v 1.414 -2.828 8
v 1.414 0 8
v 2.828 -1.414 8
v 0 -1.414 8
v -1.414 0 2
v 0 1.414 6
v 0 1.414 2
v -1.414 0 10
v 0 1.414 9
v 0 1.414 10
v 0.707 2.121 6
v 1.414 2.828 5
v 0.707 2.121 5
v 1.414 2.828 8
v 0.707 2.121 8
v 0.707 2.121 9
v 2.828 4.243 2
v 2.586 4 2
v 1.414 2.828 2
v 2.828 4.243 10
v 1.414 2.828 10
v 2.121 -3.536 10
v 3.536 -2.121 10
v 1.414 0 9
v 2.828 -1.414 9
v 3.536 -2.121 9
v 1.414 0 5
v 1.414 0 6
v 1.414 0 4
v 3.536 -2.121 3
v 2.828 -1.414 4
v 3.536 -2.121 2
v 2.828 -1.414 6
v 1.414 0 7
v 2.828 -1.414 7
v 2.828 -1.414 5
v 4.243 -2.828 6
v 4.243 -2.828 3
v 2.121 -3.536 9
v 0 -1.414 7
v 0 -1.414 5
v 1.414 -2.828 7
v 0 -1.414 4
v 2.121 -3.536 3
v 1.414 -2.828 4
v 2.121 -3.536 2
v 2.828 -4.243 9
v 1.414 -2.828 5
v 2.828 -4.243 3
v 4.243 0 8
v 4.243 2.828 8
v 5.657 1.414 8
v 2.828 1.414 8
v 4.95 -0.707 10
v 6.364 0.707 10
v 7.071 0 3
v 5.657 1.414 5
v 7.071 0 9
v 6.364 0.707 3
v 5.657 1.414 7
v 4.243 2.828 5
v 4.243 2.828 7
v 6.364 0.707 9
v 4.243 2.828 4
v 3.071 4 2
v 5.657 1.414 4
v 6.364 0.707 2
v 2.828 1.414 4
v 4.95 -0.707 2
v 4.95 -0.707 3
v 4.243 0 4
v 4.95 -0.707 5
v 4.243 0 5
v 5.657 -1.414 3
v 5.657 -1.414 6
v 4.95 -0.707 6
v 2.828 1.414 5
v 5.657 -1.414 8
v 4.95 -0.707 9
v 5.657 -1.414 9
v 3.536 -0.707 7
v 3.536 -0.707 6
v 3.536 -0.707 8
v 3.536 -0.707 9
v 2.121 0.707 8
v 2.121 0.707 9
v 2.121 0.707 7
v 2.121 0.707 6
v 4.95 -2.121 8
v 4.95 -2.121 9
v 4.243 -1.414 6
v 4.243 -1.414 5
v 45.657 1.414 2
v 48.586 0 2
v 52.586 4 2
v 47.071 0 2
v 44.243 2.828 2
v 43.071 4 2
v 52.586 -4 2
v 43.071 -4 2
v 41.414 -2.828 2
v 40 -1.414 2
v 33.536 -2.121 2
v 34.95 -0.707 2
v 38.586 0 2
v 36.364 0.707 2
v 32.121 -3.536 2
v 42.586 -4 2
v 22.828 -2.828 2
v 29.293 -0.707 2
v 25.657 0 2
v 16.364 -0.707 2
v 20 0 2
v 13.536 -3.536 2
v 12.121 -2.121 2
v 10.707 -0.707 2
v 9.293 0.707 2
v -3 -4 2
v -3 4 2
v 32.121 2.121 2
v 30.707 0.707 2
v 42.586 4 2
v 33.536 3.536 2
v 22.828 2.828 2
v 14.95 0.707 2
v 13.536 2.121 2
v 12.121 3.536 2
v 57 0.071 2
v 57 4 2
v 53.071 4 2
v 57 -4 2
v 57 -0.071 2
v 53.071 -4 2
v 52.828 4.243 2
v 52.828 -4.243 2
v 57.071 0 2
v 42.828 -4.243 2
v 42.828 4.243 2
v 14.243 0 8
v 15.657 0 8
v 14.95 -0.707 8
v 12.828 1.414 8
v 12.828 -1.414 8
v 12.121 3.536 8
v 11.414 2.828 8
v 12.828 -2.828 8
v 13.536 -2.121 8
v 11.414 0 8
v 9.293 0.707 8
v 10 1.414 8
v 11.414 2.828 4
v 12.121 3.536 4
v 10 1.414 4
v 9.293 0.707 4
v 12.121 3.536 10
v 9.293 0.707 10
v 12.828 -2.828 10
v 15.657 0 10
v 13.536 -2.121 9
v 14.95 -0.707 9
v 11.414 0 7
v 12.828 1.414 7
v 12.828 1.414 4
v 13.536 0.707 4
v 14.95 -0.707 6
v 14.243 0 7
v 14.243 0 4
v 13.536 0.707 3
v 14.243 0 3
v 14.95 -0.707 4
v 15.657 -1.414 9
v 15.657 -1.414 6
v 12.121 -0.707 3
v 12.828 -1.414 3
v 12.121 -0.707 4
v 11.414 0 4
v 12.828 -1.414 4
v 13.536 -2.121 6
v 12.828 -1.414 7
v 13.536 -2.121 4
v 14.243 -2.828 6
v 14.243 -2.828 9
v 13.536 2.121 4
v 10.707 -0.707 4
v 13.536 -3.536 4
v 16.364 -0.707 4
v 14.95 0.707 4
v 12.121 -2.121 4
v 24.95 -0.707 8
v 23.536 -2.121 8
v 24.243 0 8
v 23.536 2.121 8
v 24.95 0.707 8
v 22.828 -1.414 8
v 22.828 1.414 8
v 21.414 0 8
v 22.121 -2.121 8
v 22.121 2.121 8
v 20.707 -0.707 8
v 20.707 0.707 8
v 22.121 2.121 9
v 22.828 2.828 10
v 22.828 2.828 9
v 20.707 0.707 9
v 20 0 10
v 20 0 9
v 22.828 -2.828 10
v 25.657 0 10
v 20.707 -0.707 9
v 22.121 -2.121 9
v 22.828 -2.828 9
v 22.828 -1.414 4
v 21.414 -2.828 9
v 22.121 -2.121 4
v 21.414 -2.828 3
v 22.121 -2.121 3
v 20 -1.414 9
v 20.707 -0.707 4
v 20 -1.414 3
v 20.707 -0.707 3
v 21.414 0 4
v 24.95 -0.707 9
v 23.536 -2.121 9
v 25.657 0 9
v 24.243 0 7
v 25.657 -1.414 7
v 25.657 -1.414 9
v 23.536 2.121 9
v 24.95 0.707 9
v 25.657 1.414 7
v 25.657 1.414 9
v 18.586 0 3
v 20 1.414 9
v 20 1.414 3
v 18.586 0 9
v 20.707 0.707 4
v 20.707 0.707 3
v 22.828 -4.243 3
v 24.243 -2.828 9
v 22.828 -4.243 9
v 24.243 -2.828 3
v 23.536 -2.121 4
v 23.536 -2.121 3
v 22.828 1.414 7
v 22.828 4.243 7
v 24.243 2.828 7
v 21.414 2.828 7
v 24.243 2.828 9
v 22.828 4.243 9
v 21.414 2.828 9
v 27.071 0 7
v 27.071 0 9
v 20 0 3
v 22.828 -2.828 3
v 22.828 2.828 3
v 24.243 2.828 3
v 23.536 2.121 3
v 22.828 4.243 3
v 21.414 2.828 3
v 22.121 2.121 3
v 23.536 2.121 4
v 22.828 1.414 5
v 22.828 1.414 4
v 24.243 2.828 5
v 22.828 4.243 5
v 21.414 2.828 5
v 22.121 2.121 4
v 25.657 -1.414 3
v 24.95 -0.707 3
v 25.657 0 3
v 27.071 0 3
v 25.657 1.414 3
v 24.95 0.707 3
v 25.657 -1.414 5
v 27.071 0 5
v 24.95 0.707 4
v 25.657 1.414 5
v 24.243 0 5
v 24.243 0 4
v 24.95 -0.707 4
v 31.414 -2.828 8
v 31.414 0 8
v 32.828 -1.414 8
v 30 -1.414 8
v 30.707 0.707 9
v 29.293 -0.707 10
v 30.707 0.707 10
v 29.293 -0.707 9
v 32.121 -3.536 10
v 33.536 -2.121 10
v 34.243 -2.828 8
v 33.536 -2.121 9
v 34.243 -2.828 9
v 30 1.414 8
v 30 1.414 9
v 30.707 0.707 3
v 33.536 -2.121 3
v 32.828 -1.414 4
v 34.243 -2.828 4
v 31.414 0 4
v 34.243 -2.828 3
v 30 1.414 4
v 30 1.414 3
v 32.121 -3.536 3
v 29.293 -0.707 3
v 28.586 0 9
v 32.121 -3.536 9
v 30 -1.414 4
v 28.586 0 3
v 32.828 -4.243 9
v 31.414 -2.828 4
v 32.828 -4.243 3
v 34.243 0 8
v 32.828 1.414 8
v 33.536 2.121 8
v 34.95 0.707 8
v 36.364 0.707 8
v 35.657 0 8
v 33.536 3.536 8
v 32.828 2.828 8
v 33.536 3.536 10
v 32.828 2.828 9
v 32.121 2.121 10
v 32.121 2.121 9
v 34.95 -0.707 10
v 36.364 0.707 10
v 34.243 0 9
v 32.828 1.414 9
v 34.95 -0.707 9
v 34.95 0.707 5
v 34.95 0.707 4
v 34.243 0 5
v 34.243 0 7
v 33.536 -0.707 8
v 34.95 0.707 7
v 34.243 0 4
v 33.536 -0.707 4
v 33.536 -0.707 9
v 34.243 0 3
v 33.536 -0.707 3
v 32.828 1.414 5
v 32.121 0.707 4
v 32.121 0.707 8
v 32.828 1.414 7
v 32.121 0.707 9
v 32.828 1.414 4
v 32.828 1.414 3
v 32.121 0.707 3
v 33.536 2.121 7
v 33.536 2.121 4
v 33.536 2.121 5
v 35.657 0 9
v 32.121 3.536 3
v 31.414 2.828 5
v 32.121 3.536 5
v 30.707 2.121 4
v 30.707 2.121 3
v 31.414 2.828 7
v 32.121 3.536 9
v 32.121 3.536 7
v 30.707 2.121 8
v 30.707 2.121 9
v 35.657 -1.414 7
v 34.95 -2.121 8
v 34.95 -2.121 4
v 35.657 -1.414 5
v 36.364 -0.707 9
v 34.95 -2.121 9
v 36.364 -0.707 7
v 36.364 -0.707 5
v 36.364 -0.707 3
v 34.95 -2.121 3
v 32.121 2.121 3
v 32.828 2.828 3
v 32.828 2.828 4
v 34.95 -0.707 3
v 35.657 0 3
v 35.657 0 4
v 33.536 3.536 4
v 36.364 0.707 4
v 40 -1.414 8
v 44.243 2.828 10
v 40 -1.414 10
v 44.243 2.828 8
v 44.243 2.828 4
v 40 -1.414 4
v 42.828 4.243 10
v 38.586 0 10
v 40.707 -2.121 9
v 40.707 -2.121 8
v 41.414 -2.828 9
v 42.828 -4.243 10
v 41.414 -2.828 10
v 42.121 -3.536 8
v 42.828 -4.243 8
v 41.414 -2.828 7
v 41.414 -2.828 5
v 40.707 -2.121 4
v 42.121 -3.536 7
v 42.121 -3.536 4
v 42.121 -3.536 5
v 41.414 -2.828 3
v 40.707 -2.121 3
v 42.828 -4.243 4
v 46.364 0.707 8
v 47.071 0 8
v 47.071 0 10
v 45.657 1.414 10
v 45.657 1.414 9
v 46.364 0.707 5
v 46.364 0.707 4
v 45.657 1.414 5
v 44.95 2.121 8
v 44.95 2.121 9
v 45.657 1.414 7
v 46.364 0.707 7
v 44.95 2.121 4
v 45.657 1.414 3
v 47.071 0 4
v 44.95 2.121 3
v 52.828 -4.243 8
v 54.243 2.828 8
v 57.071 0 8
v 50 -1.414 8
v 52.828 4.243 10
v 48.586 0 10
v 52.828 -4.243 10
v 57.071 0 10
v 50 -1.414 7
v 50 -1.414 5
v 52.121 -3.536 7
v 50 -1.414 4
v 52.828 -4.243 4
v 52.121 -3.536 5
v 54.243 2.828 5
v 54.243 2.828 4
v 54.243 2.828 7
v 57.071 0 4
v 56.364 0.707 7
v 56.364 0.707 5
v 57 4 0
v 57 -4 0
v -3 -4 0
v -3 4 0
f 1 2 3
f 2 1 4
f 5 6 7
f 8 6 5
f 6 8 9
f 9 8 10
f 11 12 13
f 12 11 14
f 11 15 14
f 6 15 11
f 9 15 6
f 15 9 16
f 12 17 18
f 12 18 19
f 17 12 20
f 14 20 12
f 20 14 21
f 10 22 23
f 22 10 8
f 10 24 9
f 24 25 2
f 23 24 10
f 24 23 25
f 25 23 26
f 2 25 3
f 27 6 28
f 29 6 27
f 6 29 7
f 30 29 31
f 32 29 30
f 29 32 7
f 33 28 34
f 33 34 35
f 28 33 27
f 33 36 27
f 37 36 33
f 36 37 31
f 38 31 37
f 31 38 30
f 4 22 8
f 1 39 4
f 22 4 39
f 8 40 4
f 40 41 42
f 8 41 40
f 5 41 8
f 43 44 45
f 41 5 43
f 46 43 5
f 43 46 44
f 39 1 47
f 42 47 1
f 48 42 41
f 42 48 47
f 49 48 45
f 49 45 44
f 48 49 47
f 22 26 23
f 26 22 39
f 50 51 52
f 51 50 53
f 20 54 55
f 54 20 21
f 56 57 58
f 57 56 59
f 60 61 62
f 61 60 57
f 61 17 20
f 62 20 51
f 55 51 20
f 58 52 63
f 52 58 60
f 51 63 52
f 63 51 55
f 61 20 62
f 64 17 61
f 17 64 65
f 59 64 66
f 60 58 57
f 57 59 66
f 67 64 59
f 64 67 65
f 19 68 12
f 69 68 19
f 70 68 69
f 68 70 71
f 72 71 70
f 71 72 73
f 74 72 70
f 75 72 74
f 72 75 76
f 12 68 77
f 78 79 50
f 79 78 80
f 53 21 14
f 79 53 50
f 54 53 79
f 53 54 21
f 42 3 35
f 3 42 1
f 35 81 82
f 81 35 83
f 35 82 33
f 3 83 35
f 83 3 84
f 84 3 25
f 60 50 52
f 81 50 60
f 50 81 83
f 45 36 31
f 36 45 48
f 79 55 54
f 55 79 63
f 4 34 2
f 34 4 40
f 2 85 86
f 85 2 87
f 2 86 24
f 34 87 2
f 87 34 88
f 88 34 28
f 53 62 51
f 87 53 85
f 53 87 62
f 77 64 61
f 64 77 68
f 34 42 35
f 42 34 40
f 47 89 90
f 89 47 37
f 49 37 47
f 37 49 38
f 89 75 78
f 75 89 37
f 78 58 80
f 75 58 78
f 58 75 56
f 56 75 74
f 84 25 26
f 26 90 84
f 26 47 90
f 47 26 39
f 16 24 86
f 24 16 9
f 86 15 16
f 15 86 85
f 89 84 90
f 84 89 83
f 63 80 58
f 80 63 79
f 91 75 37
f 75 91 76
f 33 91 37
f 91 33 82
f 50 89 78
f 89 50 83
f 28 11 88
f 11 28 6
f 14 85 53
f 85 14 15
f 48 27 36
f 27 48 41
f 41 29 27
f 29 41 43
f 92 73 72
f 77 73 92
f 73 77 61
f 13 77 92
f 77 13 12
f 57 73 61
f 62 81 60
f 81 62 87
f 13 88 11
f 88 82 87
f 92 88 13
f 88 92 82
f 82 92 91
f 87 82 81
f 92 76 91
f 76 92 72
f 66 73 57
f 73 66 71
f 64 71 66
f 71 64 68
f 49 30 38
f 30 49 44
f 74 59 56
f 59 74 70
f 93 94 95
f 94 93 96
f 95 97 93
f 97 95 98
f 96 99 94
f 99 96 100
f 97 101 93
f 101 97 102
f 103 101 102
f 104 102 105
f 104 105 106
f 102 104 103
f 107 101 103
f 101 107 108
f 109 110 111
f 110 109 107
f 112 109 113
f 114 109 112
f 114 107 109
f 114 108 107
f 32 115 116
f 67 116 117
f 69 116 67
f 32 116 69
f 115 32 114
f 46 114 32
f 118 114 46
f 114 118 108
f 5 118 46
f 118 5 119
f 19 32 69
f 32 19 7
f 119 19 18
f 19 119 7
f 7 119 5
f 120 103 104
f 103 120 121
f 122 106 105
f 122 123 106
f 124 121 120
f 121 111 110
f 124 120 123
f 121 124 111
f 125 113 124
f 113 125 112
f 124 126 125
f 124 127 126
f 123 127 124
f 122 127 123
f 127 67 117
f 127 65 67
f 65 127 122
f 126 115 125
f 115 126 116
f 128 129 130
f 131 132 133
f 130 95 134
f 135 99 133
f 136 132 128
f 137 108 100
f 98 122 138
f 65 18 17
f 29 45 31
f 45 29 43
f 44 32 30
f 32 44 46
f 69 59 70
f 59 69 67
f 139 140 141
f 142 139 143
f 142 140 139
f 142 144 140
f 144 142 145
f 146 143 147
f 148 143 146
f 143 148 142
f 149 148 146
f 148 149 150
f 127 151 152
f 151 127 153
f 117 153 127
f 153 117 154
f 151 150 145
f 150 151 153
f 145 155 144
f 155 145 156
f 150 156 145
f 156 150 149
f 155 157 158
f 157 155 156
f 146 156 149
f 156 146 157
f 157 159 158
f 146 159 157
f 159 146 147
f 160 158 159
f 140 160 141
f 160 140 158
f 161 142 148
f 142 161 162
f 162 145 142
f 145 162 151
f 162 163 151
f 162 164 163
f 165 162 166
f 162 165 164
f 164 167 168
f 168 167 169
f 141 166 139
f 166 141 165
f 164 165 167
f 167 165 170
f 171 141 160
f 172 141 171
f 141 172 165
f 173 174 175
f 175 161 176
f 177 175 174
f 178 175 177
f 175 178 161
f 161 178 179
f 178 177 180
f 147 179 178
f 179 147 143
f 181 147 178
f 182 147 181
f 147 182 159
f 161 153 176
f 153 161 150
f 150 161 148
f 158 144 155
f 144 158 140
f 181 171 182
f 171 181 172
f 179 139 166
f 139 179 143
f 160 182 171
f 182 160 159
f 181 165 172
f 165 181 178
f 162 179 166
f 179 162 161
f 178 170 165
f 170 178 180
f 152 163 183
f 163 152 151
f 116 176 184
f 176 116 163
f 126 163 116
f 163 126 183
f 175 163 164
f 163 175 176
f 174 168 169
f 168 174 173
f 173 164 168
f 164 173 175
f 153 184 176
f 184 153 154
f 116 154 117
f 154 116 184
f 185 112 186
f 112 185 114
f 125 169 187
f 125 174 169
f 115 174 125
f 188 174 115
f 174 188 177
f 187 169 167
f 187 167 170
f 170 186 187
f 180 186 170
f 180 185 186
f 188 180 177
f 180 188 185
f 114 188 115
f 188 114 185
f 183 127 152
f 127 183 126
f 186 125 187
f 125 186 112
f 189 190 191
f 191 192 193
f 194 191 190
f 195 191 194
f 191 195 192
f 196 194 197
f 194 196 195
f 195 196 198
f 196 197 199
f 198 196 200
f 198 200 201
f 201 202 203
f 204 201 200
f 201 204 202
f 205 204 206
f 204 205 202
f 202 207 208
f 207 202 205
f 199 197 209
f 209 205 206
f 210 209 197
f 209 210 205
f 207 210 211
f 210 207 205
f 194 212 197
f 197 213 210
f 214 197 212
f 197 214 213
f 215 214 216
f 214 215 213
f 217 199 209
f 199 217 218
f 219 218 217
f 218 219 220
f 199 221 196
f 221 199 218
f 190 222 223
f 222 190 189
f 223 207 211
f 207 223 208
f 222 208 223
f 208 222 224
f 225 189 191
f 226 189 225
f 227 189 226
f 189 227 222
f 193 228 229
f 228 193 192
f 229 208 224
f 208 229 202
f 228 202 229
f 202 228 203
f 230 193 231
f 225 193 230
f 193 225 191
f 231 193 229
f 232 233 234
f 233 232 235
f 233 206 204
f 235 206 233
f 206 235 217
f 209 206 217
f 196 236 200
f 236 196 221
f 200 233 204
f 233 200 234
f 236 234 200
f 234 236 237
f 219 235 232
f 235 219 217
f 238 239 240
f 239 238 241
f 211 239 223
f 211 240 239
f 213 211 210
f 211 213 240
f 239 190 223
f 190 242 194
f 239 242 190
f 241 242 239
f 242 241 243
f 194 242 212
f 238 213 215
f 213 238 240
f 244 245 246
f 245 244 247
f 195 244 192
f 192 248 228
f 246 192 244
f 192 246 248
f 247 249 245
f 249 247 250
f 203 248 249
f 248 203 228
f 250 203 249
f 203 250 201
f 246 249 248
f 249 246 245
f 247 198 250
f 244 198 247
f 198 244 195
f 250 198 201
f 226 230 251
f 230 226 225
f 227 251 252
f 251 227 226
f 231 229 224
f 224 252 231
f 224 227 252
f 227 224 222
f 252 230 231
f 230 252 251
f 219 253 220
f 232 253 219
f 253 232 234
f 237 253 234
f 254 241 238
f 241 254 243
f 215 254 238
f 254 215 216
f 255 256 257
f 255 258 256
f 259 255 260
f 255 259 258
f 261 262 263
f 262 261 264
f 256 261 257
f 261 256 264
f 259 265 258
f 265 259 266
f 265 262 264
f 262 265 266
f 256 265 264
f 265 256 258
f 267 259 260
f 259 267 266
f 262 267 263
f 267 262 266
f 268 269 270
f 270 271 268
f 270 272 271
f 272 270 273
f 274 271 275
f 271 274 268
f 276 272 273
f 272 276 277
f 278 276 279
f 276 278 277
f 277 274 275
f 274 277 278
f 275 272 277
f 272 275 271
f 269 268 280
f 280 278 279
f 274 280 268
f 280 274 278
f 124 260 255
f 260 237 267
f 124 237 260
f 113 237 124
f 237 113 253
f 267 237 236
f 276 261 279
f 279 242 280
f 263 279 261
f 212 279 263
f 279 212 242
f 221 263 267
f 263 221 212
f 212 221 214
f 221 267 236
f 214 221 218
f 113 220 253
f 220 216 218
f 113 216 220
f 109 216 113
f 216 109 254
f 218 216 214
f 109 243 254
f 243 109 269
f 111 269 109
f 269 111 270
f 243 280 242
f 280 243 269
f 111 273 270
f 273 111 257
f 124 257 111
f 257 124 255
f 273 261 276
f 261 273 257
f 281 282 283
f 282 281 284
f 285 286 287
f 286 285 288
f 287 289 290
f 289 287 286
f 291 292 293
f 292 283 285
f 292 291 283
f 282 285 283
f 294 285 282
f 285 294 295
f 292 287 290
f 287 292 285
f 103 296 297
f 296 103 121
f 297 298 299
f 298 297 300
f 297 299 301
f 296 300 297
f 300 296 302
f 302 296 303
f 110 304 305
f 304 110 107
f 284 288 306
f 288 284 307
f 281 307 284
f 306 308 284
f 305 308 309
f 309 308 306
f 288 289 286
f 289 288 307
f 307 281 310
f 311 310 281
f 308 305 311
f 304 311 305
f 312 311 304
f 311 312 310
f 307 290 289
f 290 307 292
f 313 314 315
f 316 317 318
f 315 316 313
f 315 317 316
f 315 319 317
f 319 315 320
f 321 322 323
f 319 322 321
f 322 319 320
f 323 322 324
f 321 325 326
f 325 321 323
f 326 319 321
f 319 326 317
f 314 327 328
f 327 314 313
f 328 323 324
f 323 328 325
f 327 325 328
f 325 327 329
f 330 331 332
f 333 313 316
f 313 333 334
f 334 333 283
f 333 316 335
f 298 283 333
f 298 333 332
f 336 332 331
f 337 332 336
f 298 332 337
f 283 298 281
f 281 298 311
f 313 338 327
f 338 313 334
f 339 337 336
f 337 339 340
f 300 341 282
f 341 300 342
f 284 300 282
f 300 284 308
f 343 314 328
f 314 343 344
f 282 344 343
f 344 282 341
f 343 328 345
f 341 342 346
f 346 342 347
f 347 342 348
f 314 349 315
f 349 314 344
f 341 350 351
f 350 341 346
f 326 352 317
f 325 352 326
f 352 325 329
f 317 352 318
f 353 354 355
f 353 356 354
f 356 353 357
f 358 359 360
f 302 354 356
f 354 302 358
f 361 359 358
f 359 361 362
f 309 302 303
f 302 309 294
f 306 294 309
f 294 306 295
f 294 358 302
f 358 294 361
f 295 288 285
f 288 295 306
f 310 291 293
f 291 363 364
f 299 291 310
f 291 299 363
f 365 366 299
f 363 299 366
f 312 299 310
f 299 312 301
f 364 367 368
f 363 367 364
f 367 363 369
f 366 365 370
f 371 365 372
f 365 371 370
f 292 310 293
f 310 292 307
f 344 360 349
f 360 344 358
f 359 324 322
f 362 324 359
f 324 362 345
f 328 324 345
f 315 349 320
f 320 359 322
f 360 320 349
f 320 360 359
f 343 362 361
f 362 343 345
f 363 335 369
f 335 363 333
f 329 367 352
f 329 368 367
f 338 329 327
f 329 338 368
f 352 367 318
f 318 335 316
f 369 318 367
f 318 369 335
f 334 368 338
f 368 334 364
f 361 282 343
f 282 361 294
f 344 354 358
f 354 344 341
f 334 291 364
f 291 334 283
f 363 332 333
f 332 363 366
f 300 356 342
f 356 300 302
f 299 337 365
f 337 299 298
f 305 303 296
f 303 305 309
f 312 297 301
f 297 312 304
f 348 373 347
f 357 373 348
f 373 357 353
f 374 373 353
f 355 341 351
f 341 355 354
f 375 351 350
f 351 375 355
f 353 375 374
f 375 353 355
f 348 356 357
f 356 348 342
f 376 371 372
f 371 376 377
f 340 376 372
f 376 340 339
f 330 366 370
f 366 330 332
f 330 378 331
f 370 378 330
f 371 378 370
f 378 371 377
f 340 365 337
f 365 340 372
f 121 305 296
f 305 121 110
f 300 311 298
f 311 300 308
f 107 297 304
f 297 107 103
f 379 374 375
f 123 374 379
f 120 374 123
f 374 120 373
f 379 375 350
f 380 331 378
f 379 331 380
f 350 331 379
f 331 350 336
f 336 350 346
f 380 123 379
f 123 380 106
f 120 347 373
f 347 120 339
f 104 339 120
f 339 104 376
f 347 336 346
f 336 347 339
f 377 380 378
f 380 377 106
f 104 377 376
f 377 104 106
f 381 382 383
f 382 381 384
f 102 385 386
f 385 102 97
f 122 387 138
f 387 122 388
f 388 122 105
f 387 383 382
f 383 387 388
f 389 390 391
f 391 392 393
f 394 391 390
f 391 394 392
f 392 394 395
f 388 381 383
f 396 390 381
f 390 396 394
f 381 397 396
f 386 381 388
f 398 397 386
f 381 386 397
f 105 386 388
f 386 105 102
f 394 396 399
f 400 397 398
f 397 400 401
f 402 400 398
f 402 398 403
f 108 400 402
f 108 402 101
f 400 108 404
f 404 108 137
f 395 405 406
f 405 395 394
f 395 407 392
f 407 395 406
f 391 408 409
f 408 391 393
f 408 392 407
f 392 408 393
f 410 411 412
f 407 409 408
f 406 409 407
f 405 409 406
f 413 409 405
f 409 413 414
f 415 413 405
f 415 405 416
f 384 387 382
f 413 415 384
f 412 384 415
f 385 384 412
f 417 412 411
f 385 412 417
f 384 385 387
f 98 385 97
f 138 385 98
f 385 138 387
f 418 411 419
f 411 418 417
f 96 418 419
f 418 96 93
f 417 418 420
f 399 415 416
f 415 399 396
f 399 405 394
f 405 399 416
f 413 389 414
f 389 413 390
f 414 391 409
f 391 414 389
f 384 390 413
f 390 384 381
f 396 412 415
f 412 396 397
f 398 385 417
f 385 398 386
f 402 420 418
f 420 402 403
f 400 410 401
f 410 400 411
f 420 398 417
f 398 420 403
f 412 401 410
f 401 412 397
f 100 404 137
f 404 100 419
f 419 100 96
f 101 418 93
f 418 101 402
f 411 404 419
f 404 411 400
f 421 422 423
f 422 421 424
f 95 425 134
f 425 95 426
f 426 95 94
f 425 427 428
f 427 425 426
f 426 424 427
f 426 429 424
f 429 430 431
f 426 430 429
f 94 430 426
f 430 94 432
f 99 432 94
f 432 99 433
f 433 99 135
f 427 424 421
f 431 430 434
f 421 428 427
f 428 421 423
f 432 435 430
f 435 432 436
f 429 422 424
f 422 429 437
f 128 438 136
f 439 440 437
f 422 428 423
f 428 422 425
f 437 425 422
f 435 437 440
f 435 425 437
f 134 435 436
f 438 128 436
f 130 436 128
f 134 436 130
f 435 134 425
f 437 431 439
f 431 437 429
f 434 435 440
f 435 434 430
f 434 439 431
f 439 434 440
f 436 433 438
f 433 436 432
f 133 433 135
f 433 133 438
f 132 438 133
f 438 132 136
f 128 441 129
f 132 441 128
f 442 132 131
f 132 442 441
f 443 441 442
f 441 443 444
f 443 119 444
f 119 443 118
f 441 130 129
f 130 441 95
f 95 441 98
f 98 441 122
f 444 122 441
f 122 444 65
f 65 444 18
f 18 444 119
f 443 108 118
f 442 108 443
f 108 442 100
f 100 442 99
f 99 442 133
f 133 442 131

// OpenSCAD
// Generated 3D Letter Combinations
// NICK   + BROOKE

$fn=20;
// Base Plate
translate([-3, -4, 0]) cube([60, 8, 2]);

// Letter N + B
translate([0,0,9]) translate([0, 0, 0]) rotate([45,90,0]) {
  union() {
    translate([0, 0, 0]) {
        cube([2,2,2], center=true);
    }
    translate([0, 0, 1]) {
        cube([2,2,2], center=true);
    }
    translate([0, 0, 2]) {
        cube([2,2,2], center=true);
    }
    translate([0, 0, 3]) {
        cube([2,2,2], center=true);
    }
    translate([0, 4, 0]) {
        cube([2,2,2], center=true);
    }
    translate([0, 4, 1]) {
        cube([2,2,2], center=true);
    }
    translate([0, 4, 2]) {
        cube([2,2,2], center=true);
    }
    translate([0, 4, 3]) {
        cube([2,2,2], center=true);
    }
    translate([1, 0, 0]) {
        cube([2,2,2], center=true);
    }
    translate([1, 0, 4]) {
        cube([2,2,2], center=true);
    }
    translate([1, 1, 0]) {
        cube([2,2,2], center=true);
    }
    translate([1, 1, 4]) {
        cube([2,2,2], center=true);
    }
    translate([1, 4, 0]) {
        cube([2,2,2], center=true);
    }
    translate([1, 4, 4]) {
        cube([2,2,2], center=true);
    }
    translate([2, 0, 0]) {
        cube([2,2,2], center=true);
    }
    translate([2, 0, 4]) {
        cube([2,2,2], center=true);
    }
    translate([2, 2, 0]) {
        cube([2,2,2], center=true);
    }
    translate([2, 2, 4]) {
        cube([2,2,2], center=true);
    }
    translate([2, 4, 0]) {
        cube([2,2,2], center=true);
    }
    translate([2, 4, 4]) {
        cube([2,2,2], center=true);
    }
    translate([3, 0, 0]) {
        cube([2,2,2], center=true);
    }
    translate([3, 0, 1]) {
        cube([2,2,2], center=true);
    }
    translate([3, 0, 2]) {
        cube([2,2,2], center=true);
    }
    translate([3, 0, 3]) {
        cube([2,2,2], center=true);
    }
    translate([3, 3, 0]) {
        cube([2,2,2], center=true);
    }
    translate([3, 3, 1]) {
        cube([2,2,2], center=true);
    }
    translate([3, 3, 2]) {
        cube([2,2,2], center=true);
    }
    translate([3, 3, 3]) {
        cube([2,2,2], center=true);
    }
    translate([3, 4, 0]) {
        cube([2,2,2], center=true);
    }
    translate([3, 4, 1]) {
        cube([2,2,2], center=true);
    }
    translate([3, 4, 2]) {
        cube([2,2,2], center=true);
    }
    translate([3, 4, 3]) {
        cube([2,2,2], center=true);
    }
    translate([4, 0, 0]) {
        cube([2,2,2], center=true);
    }
    translate([4, 0, 4]) {
        cube([2,2,2], center=true);
    }
    translate([4, 4, 0]) {
        cube([2,2,2], center=true);
    }
    translate([4, 4, 4]) {
        cube([2,2,2], center=true);
    }
    translate([5, 0, 0]) {
        cube([2,2,2], center=true);
    }
    translate([5, 0, 4]) {
        cube([2,2,2], center=true);
    }
    translate([5, 4, 0]) {
        cube([2,2,2], center=true);
    }
    translate([5, 4, 4]) {
        cube([2,2,2], center=true);
    }
    translate([6, 0, 0]) {
        cube([2,2,2], center=true);
    }
    translate([6, 0, 1]) {
        cube([2,2,2], center=true);
    }
    translate([6, 0, 2]) {
        cube([2,2,2], center=true);
    }
    translate([6, 0, 3]) {
        cube([2,2,2], center=true);
    }
    translate([6, 4, 0]) {
        cube([2,2,2], center=true);
    }
    translate([6, 4, 1]) {
        cube([2,2,2], center=true);
    }
    translate([6, 4, 2]) {
        cube([2,2,2], center=true);
    }
    translate([6, 4, 3]) {
        cube([2,2,2], center=true);
    }
  }
}

// Letter I + R
translate([0,0,9]) translate([10, 0, 0]) rotate([45,90,0]) {
  union() {
    translate([0, 1, 0]) {
        cube([2,2,2], center=true);
    }
    translate([0, 1, 1]) {
        cube([2,2,2], center=true);
    }
    translate([0, 1, 2]) {
        cube([2,2,2], center=true);
    }
    translate([0, 1, 3]) {
        cube([2,2,2], center=true);
    }
    translate([0, 2, 0]) {
        cube([2,2,2], center=true);
    }
    translate([0, 2, 1]) {
        cube([2,2,2], center=true);
    }
    translate([0, 2, 2]) {
        cube([2,2,2], center=true);
    }
    translate([0, 2, 3]) {
        cube([2,2,2], center=true);
    }
    translate([0, 3, 0]) {
        cube([2,2,2], center=true);
    }
    translate([0, 3, 1]) {
        cube([2,2,2], center=true);
    }
    translate([0, 3, 2]) {
        cube([2,2,2], center=true);
    }
    translate([0, 3, 3]) {
        cube([2,2,2], center=true);
    }
    translate([1, 2, 0]) {
        cube([2,2,2], center=true);
    }
    translate([1, 2, 4]) {
        cube([2,2,2], center=true);
    }
    translate([2, 2, 0]) {
        cube([2,2,2], center=true);
    }
    translate([2, 2, 4]) {
        cube([2,2,2], center=true);
    }
    translate([3, 2, 0]) {
        cube([2,2,2], center=true);
    }
    translate([3, 2, 1]) {
        cube([2,2,2], center=true);
    }
    translate([3, 2, 2]) {
        cube([2,2,2], center=true);
    }
    translate([3, 2, 3]) {
        cube([2,2,2], center=true);
    }
    translate([4, 2, 0]) {
        cube([2,2,2], center=true);
    }
    translate([4, 2, 2]) {
        cube([2,2,2], center=true);
    }
    translate([5, 2, 0]) {
        cube([2,2,2], center=true);
    }
    translate([5, 2, 3]) {
        cube([2,2,2], center=true);
    }
    translate([6, 1, 0]) {
        cube([2,2,2], center=true);
    }
    translate([6, 1, 4]) {
        cube([2,2,2], center=true);
    }
    translate([6, 2, 0]) {
        cube([2,2,2], center=true);
    }
    translate([6, 2, 4]) {
        cube([2,2,2], center=true);
    }
    translate([6, 3, 0]) {
        cube([2,2,2], center=true);
    }
    translate([6, 3, 4]) {
        cube([2,2,2], center=true);
    }
  }
}

// Letter C + O
translate([0,0,9]) translate([20, 0, 0]) rotate([45,90,0]) {
  union() {
    translate([0, 1, 1]) {
        cube([2,2,2], center=true);
    }
    translate([0, 1, 2]) {
        cube([2,2,2], center=true);
    }
    translate([0, 1, 3]) {
        cube([2,2,2], center=true);
    }
    translate([0, 2, 1]) {
        cube([2,2,2], center=true);
    }
    translate([0, 2, 2]) {
        cube([2,2,2], center=true);
    }
    translate([0, 2, 3]) {
        cube([2,2,2], center=true);
    }
    translate([0, 3, 1]) {
        cube([2,2,2], center=true);
    }
    translate([0, 3, 2]) {
        cube([2,2,2], center=true);
    }
    translate([0, 3, 3]) {
        cube([2,2,2], center=true);
    }
    translate([1, 0, 0]) {
        cube([2,2,2], center=true);
    }
    translate([1, 0, 4]) {
        cube([2,2,2], center=true);
    }
    translate([1, 4, 0]) {
        cube([2,2,2], center=true);
    }
    translate([1, 4, 4]) {
        cube([2,2,2], center=true);
    }
    translate([2, 0, 0]) {
        cube([2,2,2], center=true);
    }
    translate([2, 0, 4]) {
        cube([2,2,2], center=true);
    }
    translate([3, 0, 0]) {
        cube([2,2,2], center=true);
    }
    translate([3, 0, 4]) {
        cube([2,2,2], center=true);
    }
    translate([4, 0, 0]) {
        cube([2,2,2], center=true);
    }
    translate([4, 0, 4]) {
        cube([2,2,2], center=true);
    }
    translate([5, 0, 0]) {
        cube([2,2,2], center=true);
    }
    translate([5, 0, 4]) {
        cube([2,2,2], center=true);
    }
    translate([5, 4, 0]) {
        cube([2,2,2], center=true);
    }
    translate([5, 4, 4]) {
        cube([2,2,2], center=true);
    }
    translate([6, 1, 1]) {
        cube([2,2,2], center=true);
    }
    translate([6, 1, 2]) {
        cube([2,2,2], center=true);
    }
    translate([6, 1, 3]) {
        cube([2,2,2], center=true);
    }
    translate([6, 2, 1]) {
        cube([2,2,2], center=true);
    }
    translate([6, 2, 2]) {
        cube([2,2,2], center=true);
    }
    translate([6, 2, 3]) {
        cube([2,2,2], center=true);
    }
    translate([6, 3, 1]) {
        cube([2,2,2], center=true);
    }
    translate([6, 3, 2]) {
        cube([2,2,2], center=true);
    }
    translate([6, 3, 3]) {
        cube([2,2,2], center=true);
    }
  }
}

// Letter K + O
translate([0,0,9]) translate([30, 0, 0]) rotate([45,90,0]) {
  union() {
    translate([0, 0, 1]) {
        cube([2,2,2], center=true);
    }
    translate([0, 0, 2]) {
        cube([2,2,2], center=true);
    }
    translate([0, 0, 3]) {
        cube([2,2,2], center=true);
    }
    translate([0, 4, 1]) {
        cube([2,2,2], center=true);
    }
    translate([0, 4, 2]) {
        cube([2,2,2], center=true);
    }
    translate([0, 4, 3]) {
        cube([2,2,2], center=true);
    }
    translate([1, 0, 0]) {
        cube([2,2,2], center=true);
    }
    translate([1, 0, 4]) {
        cube([2,2,2], center=true);
    }
    translate([1, 3, 0]) {
        cube([2,2,2], center=true);
    }
    translate([1, 3, 4]) {
        cube([2,2,2], center=true);
    }
    translate([2, 0, 0]) {
        cube([2,2,2], center=true);
    }
    translate([2, 0, 4]) {
        cube([2,2,2], center=true);
    }
    translate([2, 2, 0]) {
        cube([2,2,2], center=true);
    }
    translate([2, 2, 4]) {
        cube([2,2,2], center=true);
    }
    translate([3, 0, 0]) {
        cube([2,2,2], center=true);
    }
    translate([3, 0, 4]) {
        cube([2,2,2], center=true);
    }
    translate([3, 1, 0]) {
        cube([2,2,2], center=true);
    }
    translate([3, 1, 4]) {
        cube([2,2,2], center=true);
    }
    translate([4, 0, 0]) {
        cube([2,2,2], center=true);
    }
    translate([4, 0, 4]) {
        cube([2,2,2], center=true);
    }
    translate([4, 2, 0]) {
        cube([2,2,2], center=true);
    }
    translate([4, 2, 4]) {
        cube([2,2,2], center=true);
    }
    translate([5, 0, 0]) {
        cube([2,2,2], center=true);
    }
    translate([5, 0, 4]) {
        cube([2,2,2], center=true);
    }
    translate([5, 3, 0]) {
        cube([2,2,2], center=true);
    }
    translate([5, 3, 4]) {
        cube([2,2,2], center=true);
    }
    translate([6, 0, 1]) {
        cube([2,2,2], center=true);
    }
    translate([6, 0, 2]) {
        cube([2,2,2], center=true);
    }
    translate([6, 0, 3]) {
        cube([2,2,2], center=true);
    }
    translate([6, 4, 1]) {
        cube([2,2,2], center=true);
    }
    translate([6, 4, 2]) {
        cube([2,2,2], center=true);
    }
    translate([6, 4, 3]) {
        cube([2,2,2], center=true);
    }
  }
}

// Letter   + K
translate([0,0,9]) translate([40, 0, 0]) rotate([45,90,0]) {
  union() {
    translate([0, 0, 0]) {
        cube([2,2,2], center=true);
    }
    translate([0, 0, 4]) {
        cube([2,2,2], center=true);
    }
    translate([0, 1, 0]) {
        cube([2,2,2], center=true);
    }
    translate([0, 1, 4]) {
        cube([2,2,2], center=true);
    }
    translate([0, 2, 0]) {
        cube([2,2,2], center=true);
    }
    translate([0, 2, 4]) {
        cube([2,2,2], center=true);
    }
    translate([0, 3, 0]) {
        cube([2,2,2], center=true);
    }
    translate([0, 3, 4]) {
        cube([2,2,2], center=true);
    }
    translate([0, 4, 0]) {
        cube([2,2,2], center=true);
    }
    translate([0, 4, 4]) {
        cube([2,2,2], center=true);
    }
    translate([1, 0, 0]) {
        cube([2,2,2], center=true);
    }
    translate([1, 0, 3]) {
        cube([2,2,2], center=true);
    }
    translate([1, 1, 0]) {
        cube([2,2,2], center=true);
    }
    translate([1, 1, 3]) {
        cube([2,2,2], center=true);
    }
    translate([1, 2, 0]) {
        cube([2,2,2], center=true);
    }
    translate([1, 2, 3]) {
        cube([2,2,2], center=true);
    }
    translate([1, 3, 0]) {
        cube([2,2,2], center=true);
    }
    translate([1, 3, 3]) {
        cube([2,2,2], center=true);
    }
    translate([1, 4, 0]) {
        cube([2,2,2], center=true);
    }
    translate([1, 4, 3]) {
        cube([2,2,2], center=true);
    }
    translate([2, 0, 0]) {
        cube([2,2,2], center=true);
    }
    translate([2, 0, 2]) {
        cube([2,2,2], center=true);
    }
    translate([2, 1, 0]) {
        cube([2,2,2], center=true);
    }
    translate([2, 1, 2]) {
        cube([2,2,2], center=true);
    }
    translate([2, 2, 0]) {
        cube([2,2,2], center=true);
    }
    translate([2, 2, 2]) {
        cube([2,2,2], center=true);
    }
    translate([2, 3, 0]) {
        cube([2,2,2], center=true);
    }
    translate([2, 3, 2]) {
        cube([2,2,2], center=true);
    }
    translate([2, 4, 0]) {
        cube([2,2,2], center=true);
    }
    translate([2, 4, 2]) {
        cube([2,2,2], center=true);
    }
    translate([3, 0, 0]) {
        cube([2,2,2], center=true);
    }
    translate([3, 0, 1]) {
        cube([2,2,2], center=true);
    }
    translate([3, 1, 0]) {
        cube([2,2,2], center=true);
    }
    translate([3, 1, 1]) {
        cube([2,2,2], center=true);
    }
    translate([3, 2, 0]) {
        cube([2,2,2], center=true);
    }
    translate([3, 2, 1]) {
        cube([2,2,2], center=true);
    }
    translate([3, 3, 0]) {
        cube([2,2,2], center=true);
    }
    translate([3, 3, 1]) {
        cube([2,2,2], center=true);
    }
    translate([3, 4, 0]) {
        cube([2,2,2], center=true);
    }
    translate([3, 4, 1]) {
        cube([2,2,2], center=true);
    }
    translate([4, 0, 0]) {
        cube([2,2,2], center=true);
    }
    translate([4, 0, 2]) {
        cube([2,2,2], center=true);
    }
    translate([4, 1, 0]) {
        cube([2,2,2], center=true);
    }
    translate([4, 1, 2]) {
        cube([2,2,2], center=true);
    }
    translate([4, 2, 0]) {
        cube([2,2,2], center=true);
    }
    translate([4, 2, 2]) {
        cube([2,2,2], center=true);
    }
    translate([4, 3, 0]) {
        cube([2,2,2], center=true);
    }
    translate([4, 3, 2]) {
        cube([2,2,2], center=true);
    }
    translate([4, 4, 0]) {
        cube([2,2,2], center=true);
    }
    translate([4, 4, 2]) {
        cube([2,2,2], center=true);
    }
    translate([5, 0, 0]) {
        cube([2,2,2], center=true);
    }
    translate([5, 0, 3]) {
        cube([2,2,2], center=true);
    }
    translate([5, 1, 0]) {
        cube([2,2,2], center=true);
    }
    translate([5, 1, 3]) {
        cube([2,2,2], center=true);
    }
    translate([5, 2, 0]) {
        cube([2,2,2], center=true);
    }
    translate([5, 2, 3]) {
        cube([2,2,2], center=true);
    }
    translate([5, 3, 0]) {
        cube([2,2,2], center=true);
    }
    translate([5, 3, 3]) {
        cube([2,2,2], center=true);
    }
    translate([5, 4, 0]) {
        cube([2,2,2], center=true);
    }
    translate([5, 4, 3]) {
        cube([2,2,2], center=true);
    }
    translate([6, 0, 0]) {
        cube([2,2,2], center=true);
    }
    translate([6, 0, 4]) {
        cube([2,2,2], center=true);
    }
    translate([6, 1, 0]) {
        cube([2,2,2], center=true);
    }
    translate([6, 1, 4]) {
        cube([2,2,2], center=true);
    }
    translate([6, 2, 0]) {
        cube([2,2,2], center=true);
    }
    translate([6, 2, 4]) {
        cube([2,2,2], center=true);
    }
    translate([6, 3, 0]) {
        cube([2,2,2], center=true);
    }
    translate([6, 3, 4]) {
        cube([2,2,2], center=true);
    }
    translate([6, 4, 0]) {
        cube([2,2,2], center=true);
    }
    translate([6, 4, 4]) {
        cube([2,2,2], center=true);
    }
  }
}

// Letter   + E
translate([0,0,9]) translate([50, 0, 0]) rotate([45,90,0]) {
  union() {
    translate([0, 0, 0]) {
        cube([2,2,2], center=true);
    }
    translate([0, 0, 1]) {
        cube([2,2,2], center=true);
    }
    translate([0, 0, 2]) {
        cube([2,2,2], center=true);
    }
    translate([0, 0, 3]) {
        cube([2,2,2], center=true);
    }
    translate([0, 0, 4]) {
        cube([2,2,2], center=true);
    }
    translate([0, 1, 0]) {
        cube([2,2,2], center=true);
    }
    translate([0, 1, 1]) {
        cube([2,2,2], center=true);
    }
    translate([0, 1, 2]) {
        cube([2,2,2], center=true);
    }
    translate([0, 1, 3]) {
        cube([2,2,2], center=true);
    }
    translate([0, 1, 4]) {
        cube([2,2,2], center=true);
    }
    translate([0, 2, 0]) {
        cube([2,2,2], center=true);
    }
    translate([0, 2, 1]) {
        cube([2,2,2], center=true);
    }
    translate([0, 2, 2]) {
        cube([2,2,2], center=true);
    }
    translate([0, 2, 3]) {
        cube([2,2,2], center=true);
    }
    translate([0, 2, 4]) {
        cube([2,2,2], center=true);
    }
    translate([0, 3, 0]) {
        cube([2,2,2], center=true);
    }
    translate([0, 3, 1]) {
        cube([2,2,2], center=true);
    }
    translate([0, 3, 2]) {
        cube([2,2,2], center=true);
    }
    translate([0, 3, 3]) {
        cube([2,2,2], center=true);
    }
    translate([0, 3, 4]) {
        cube([2,2,2], center=true);
    }
    translate([0, 4, 0]) {
        cube([2,2,2], center=true);
    }
    translate([0, 4, 1]) {
        cube([2,2,2], center=true);
    }
    translate([0, 4, 2]) {
        cube([2,2,2], center=true);
    }
    translate([0, 4, 3]) {
        cube([2,2,2], center=true);
    }
    translate([0, 4, 4]) {
        cube([2,2,2], center=true);
    }
    translate([1, 0, 0]) {
        cube([2,2,2], center=true);
    }
    translate([1, 1, 0]) {
        cube([2,2,2], center=true);
    }
    translate([1, 2, 0]) {
        cube([2,2,2], center=true);
    }
    translate([1, 3, 0]) {
        cube([2,2,2], center=true);
    }
    translate([1, 4, 0]) {
        cube([2,2,2], center=true);
    }
    translate([2, 0, 0]) {
        cube([2,2,2], center=true);
    }
    translate([2, 1, 0]) {
        cube([2,2,2], center=true);
    }
    translate([2, 2, 0]) {
        cube([2,2,2], center=true);
    }
    translate([2, 3, 0]) {
        cube([2,2,2], center=true);
    }
    translate([2, 4, 0]) {
        cube([2,2,2], center=true);
    }
    translate([3, 0, 0]) {
        cube([2,2,2], center=true);
    }
    translate([3, 0, 1]) {
        cube([2,2,2], center=true);
    }
    translate([3, 0, 2]) {
        cube([2,2,2], center=true);
    }
    translate([3, 0, 3]) {
        cube([2,2,2], center=true);
    }
    translate([3, 1, 0]) {
        cube([2,2,2], center=true);
    }
    translate([3, 1, 1]) {
        cube([2,2,2], center=true);
    }
    translate([3, 1, 2]) {
        cube([2,2,2], center=true);
    }
    translate([3, 1, 3]) {
        cube([2,2,2], center=true);
    }
    translate([3, 2, 0]) {
        cube([2,2,2], center=true);
    }
    translate([3, 2, 1]) {
        cube([2,2,2], center=true);
    }
    translate([3, 2, 2]) {
        cube([2,2,2], center=true);
    }
    translate([3, 2, 3]) {
        cube([2,2,2], center=true);
    }
    translate([3, 3, 0]) {
        cube([2,2,2], center=true);
    }
    translate([3, 3, 1]) {
        cube([2,2,2], center=true);
    }
    translate([3, 3, 2]) {
        cube([2,2,2], center=true);
    }
    translate([3, 3, 3]) {
        cube([2,2,2], center=true);
    }
    translate([3, 4, 0]) {
        cube([2,2,2], center=true);
    }
    translate([3, 4, 1]) {
        cube([2,2,2], center=true);
    }
    translate([3, 4, 2]) {
        cube([2,2,2], center=true);
    }
    translate([3, 4, 3]) {
        cube([2,2,2], center=true);
    }
    translate([4, 0, 0]) {
        cube([2,2,2], center=true);
    }
    translate([4, 1, 0]) {
        cube([2,2,2], center=true);
    }
    translate([4, 2, 0]) {
        cube([2,2,2], center=true);
    }
    translate([4, 3, 0]) {
        cube([2,2,2], center=true);
    }
    translate([4, 4, 0]) {
        cube([2,2,2], center=true);
    }
    translate([5, 0, 0]) {
        cube([2,2,2], center=true);
    }
    translate([5, 1, 0]) {
        cube([2,2,2], center=true);
    }
    translate([5, 2, 0]) {
        cube([2,2,2], center=true);
    }
    translate([5, 3, 0]) {
        cube([2,2,2], center=true);
    }
    translate([5, 4, 0]) {
        cube([2,2,2], center=true);
    }
    translate([6, 0, 0]) {
        cube([2,2,2], center=true);
    }
    translate([6, 0, 1]) {
        cube([2,2,2], center=true);
    }
    translate([6, 0, 2]) {
        cube([2,2,2], center=true);
    }
    translate([6, 0, 3]) {
        cube([2,2,2], center=true);
    }
    translate([6, 0, 4]) {
        cube([2,2,2], center=true);
    }
    translate([6, 1, 0]) {
        cube([2,2,2], center=true);
    }
    translate([6, 1, 1]) {
        cube([2,2,2], center=true);
    }
    translate([6, 1, 2]) {
        cube([2,2,2], center=true);
    }
    translate([6, 1, 3]) {
        cube([2,2,2], center=true);
    }
    translate([6, 1, 4]) {
        cube([2,2,2], center=true);
    }
    translate([6, 2, 0]) {
        cube([2,2,2], center=true);
    }
    translate([6, 2, 1]) {
        cube([2,2,2], center=true);
    }
    translate([6, 2, 2]) {
        cube([2,2,2], center=true);
    }
    translate([6, 2, 3]) {
        cube([2,2,2], center=true);
    }
    translate([6, 2, 4]) {
        cube([2,2,2], center=true);
    }
    translate([6, 3, 0]) {
        cube([2,2,2], center=true);
    }
    translate([6, 3, 1]) {
        cube([2,2,2], center=true);
    }
    translate([6, 3, 2]) {
        cube([2,2,2], center=true);
    }
    translate([6, 3, 3]) {
        cube([2,2,2], center=true);
    }
    translate([6, 3, 4]) {
        cube([2,2,2], center=true);
    }
    translate([6, 4, 0]) {
        cube([2,2,2], center=true);
    }
    translate([6, 4, 1]) {
        cube([2,2,2], center=true);
    }
    translate([6, 4, 2]) {
        cube([2,2,2], center=true);
    }
    translate([6, 4, 3]) {
        cube([2,2,2], center=true);
    }
    translate([6, 4, 4]) {
        cube([2,2,2], center=true);
    }
  }
}
